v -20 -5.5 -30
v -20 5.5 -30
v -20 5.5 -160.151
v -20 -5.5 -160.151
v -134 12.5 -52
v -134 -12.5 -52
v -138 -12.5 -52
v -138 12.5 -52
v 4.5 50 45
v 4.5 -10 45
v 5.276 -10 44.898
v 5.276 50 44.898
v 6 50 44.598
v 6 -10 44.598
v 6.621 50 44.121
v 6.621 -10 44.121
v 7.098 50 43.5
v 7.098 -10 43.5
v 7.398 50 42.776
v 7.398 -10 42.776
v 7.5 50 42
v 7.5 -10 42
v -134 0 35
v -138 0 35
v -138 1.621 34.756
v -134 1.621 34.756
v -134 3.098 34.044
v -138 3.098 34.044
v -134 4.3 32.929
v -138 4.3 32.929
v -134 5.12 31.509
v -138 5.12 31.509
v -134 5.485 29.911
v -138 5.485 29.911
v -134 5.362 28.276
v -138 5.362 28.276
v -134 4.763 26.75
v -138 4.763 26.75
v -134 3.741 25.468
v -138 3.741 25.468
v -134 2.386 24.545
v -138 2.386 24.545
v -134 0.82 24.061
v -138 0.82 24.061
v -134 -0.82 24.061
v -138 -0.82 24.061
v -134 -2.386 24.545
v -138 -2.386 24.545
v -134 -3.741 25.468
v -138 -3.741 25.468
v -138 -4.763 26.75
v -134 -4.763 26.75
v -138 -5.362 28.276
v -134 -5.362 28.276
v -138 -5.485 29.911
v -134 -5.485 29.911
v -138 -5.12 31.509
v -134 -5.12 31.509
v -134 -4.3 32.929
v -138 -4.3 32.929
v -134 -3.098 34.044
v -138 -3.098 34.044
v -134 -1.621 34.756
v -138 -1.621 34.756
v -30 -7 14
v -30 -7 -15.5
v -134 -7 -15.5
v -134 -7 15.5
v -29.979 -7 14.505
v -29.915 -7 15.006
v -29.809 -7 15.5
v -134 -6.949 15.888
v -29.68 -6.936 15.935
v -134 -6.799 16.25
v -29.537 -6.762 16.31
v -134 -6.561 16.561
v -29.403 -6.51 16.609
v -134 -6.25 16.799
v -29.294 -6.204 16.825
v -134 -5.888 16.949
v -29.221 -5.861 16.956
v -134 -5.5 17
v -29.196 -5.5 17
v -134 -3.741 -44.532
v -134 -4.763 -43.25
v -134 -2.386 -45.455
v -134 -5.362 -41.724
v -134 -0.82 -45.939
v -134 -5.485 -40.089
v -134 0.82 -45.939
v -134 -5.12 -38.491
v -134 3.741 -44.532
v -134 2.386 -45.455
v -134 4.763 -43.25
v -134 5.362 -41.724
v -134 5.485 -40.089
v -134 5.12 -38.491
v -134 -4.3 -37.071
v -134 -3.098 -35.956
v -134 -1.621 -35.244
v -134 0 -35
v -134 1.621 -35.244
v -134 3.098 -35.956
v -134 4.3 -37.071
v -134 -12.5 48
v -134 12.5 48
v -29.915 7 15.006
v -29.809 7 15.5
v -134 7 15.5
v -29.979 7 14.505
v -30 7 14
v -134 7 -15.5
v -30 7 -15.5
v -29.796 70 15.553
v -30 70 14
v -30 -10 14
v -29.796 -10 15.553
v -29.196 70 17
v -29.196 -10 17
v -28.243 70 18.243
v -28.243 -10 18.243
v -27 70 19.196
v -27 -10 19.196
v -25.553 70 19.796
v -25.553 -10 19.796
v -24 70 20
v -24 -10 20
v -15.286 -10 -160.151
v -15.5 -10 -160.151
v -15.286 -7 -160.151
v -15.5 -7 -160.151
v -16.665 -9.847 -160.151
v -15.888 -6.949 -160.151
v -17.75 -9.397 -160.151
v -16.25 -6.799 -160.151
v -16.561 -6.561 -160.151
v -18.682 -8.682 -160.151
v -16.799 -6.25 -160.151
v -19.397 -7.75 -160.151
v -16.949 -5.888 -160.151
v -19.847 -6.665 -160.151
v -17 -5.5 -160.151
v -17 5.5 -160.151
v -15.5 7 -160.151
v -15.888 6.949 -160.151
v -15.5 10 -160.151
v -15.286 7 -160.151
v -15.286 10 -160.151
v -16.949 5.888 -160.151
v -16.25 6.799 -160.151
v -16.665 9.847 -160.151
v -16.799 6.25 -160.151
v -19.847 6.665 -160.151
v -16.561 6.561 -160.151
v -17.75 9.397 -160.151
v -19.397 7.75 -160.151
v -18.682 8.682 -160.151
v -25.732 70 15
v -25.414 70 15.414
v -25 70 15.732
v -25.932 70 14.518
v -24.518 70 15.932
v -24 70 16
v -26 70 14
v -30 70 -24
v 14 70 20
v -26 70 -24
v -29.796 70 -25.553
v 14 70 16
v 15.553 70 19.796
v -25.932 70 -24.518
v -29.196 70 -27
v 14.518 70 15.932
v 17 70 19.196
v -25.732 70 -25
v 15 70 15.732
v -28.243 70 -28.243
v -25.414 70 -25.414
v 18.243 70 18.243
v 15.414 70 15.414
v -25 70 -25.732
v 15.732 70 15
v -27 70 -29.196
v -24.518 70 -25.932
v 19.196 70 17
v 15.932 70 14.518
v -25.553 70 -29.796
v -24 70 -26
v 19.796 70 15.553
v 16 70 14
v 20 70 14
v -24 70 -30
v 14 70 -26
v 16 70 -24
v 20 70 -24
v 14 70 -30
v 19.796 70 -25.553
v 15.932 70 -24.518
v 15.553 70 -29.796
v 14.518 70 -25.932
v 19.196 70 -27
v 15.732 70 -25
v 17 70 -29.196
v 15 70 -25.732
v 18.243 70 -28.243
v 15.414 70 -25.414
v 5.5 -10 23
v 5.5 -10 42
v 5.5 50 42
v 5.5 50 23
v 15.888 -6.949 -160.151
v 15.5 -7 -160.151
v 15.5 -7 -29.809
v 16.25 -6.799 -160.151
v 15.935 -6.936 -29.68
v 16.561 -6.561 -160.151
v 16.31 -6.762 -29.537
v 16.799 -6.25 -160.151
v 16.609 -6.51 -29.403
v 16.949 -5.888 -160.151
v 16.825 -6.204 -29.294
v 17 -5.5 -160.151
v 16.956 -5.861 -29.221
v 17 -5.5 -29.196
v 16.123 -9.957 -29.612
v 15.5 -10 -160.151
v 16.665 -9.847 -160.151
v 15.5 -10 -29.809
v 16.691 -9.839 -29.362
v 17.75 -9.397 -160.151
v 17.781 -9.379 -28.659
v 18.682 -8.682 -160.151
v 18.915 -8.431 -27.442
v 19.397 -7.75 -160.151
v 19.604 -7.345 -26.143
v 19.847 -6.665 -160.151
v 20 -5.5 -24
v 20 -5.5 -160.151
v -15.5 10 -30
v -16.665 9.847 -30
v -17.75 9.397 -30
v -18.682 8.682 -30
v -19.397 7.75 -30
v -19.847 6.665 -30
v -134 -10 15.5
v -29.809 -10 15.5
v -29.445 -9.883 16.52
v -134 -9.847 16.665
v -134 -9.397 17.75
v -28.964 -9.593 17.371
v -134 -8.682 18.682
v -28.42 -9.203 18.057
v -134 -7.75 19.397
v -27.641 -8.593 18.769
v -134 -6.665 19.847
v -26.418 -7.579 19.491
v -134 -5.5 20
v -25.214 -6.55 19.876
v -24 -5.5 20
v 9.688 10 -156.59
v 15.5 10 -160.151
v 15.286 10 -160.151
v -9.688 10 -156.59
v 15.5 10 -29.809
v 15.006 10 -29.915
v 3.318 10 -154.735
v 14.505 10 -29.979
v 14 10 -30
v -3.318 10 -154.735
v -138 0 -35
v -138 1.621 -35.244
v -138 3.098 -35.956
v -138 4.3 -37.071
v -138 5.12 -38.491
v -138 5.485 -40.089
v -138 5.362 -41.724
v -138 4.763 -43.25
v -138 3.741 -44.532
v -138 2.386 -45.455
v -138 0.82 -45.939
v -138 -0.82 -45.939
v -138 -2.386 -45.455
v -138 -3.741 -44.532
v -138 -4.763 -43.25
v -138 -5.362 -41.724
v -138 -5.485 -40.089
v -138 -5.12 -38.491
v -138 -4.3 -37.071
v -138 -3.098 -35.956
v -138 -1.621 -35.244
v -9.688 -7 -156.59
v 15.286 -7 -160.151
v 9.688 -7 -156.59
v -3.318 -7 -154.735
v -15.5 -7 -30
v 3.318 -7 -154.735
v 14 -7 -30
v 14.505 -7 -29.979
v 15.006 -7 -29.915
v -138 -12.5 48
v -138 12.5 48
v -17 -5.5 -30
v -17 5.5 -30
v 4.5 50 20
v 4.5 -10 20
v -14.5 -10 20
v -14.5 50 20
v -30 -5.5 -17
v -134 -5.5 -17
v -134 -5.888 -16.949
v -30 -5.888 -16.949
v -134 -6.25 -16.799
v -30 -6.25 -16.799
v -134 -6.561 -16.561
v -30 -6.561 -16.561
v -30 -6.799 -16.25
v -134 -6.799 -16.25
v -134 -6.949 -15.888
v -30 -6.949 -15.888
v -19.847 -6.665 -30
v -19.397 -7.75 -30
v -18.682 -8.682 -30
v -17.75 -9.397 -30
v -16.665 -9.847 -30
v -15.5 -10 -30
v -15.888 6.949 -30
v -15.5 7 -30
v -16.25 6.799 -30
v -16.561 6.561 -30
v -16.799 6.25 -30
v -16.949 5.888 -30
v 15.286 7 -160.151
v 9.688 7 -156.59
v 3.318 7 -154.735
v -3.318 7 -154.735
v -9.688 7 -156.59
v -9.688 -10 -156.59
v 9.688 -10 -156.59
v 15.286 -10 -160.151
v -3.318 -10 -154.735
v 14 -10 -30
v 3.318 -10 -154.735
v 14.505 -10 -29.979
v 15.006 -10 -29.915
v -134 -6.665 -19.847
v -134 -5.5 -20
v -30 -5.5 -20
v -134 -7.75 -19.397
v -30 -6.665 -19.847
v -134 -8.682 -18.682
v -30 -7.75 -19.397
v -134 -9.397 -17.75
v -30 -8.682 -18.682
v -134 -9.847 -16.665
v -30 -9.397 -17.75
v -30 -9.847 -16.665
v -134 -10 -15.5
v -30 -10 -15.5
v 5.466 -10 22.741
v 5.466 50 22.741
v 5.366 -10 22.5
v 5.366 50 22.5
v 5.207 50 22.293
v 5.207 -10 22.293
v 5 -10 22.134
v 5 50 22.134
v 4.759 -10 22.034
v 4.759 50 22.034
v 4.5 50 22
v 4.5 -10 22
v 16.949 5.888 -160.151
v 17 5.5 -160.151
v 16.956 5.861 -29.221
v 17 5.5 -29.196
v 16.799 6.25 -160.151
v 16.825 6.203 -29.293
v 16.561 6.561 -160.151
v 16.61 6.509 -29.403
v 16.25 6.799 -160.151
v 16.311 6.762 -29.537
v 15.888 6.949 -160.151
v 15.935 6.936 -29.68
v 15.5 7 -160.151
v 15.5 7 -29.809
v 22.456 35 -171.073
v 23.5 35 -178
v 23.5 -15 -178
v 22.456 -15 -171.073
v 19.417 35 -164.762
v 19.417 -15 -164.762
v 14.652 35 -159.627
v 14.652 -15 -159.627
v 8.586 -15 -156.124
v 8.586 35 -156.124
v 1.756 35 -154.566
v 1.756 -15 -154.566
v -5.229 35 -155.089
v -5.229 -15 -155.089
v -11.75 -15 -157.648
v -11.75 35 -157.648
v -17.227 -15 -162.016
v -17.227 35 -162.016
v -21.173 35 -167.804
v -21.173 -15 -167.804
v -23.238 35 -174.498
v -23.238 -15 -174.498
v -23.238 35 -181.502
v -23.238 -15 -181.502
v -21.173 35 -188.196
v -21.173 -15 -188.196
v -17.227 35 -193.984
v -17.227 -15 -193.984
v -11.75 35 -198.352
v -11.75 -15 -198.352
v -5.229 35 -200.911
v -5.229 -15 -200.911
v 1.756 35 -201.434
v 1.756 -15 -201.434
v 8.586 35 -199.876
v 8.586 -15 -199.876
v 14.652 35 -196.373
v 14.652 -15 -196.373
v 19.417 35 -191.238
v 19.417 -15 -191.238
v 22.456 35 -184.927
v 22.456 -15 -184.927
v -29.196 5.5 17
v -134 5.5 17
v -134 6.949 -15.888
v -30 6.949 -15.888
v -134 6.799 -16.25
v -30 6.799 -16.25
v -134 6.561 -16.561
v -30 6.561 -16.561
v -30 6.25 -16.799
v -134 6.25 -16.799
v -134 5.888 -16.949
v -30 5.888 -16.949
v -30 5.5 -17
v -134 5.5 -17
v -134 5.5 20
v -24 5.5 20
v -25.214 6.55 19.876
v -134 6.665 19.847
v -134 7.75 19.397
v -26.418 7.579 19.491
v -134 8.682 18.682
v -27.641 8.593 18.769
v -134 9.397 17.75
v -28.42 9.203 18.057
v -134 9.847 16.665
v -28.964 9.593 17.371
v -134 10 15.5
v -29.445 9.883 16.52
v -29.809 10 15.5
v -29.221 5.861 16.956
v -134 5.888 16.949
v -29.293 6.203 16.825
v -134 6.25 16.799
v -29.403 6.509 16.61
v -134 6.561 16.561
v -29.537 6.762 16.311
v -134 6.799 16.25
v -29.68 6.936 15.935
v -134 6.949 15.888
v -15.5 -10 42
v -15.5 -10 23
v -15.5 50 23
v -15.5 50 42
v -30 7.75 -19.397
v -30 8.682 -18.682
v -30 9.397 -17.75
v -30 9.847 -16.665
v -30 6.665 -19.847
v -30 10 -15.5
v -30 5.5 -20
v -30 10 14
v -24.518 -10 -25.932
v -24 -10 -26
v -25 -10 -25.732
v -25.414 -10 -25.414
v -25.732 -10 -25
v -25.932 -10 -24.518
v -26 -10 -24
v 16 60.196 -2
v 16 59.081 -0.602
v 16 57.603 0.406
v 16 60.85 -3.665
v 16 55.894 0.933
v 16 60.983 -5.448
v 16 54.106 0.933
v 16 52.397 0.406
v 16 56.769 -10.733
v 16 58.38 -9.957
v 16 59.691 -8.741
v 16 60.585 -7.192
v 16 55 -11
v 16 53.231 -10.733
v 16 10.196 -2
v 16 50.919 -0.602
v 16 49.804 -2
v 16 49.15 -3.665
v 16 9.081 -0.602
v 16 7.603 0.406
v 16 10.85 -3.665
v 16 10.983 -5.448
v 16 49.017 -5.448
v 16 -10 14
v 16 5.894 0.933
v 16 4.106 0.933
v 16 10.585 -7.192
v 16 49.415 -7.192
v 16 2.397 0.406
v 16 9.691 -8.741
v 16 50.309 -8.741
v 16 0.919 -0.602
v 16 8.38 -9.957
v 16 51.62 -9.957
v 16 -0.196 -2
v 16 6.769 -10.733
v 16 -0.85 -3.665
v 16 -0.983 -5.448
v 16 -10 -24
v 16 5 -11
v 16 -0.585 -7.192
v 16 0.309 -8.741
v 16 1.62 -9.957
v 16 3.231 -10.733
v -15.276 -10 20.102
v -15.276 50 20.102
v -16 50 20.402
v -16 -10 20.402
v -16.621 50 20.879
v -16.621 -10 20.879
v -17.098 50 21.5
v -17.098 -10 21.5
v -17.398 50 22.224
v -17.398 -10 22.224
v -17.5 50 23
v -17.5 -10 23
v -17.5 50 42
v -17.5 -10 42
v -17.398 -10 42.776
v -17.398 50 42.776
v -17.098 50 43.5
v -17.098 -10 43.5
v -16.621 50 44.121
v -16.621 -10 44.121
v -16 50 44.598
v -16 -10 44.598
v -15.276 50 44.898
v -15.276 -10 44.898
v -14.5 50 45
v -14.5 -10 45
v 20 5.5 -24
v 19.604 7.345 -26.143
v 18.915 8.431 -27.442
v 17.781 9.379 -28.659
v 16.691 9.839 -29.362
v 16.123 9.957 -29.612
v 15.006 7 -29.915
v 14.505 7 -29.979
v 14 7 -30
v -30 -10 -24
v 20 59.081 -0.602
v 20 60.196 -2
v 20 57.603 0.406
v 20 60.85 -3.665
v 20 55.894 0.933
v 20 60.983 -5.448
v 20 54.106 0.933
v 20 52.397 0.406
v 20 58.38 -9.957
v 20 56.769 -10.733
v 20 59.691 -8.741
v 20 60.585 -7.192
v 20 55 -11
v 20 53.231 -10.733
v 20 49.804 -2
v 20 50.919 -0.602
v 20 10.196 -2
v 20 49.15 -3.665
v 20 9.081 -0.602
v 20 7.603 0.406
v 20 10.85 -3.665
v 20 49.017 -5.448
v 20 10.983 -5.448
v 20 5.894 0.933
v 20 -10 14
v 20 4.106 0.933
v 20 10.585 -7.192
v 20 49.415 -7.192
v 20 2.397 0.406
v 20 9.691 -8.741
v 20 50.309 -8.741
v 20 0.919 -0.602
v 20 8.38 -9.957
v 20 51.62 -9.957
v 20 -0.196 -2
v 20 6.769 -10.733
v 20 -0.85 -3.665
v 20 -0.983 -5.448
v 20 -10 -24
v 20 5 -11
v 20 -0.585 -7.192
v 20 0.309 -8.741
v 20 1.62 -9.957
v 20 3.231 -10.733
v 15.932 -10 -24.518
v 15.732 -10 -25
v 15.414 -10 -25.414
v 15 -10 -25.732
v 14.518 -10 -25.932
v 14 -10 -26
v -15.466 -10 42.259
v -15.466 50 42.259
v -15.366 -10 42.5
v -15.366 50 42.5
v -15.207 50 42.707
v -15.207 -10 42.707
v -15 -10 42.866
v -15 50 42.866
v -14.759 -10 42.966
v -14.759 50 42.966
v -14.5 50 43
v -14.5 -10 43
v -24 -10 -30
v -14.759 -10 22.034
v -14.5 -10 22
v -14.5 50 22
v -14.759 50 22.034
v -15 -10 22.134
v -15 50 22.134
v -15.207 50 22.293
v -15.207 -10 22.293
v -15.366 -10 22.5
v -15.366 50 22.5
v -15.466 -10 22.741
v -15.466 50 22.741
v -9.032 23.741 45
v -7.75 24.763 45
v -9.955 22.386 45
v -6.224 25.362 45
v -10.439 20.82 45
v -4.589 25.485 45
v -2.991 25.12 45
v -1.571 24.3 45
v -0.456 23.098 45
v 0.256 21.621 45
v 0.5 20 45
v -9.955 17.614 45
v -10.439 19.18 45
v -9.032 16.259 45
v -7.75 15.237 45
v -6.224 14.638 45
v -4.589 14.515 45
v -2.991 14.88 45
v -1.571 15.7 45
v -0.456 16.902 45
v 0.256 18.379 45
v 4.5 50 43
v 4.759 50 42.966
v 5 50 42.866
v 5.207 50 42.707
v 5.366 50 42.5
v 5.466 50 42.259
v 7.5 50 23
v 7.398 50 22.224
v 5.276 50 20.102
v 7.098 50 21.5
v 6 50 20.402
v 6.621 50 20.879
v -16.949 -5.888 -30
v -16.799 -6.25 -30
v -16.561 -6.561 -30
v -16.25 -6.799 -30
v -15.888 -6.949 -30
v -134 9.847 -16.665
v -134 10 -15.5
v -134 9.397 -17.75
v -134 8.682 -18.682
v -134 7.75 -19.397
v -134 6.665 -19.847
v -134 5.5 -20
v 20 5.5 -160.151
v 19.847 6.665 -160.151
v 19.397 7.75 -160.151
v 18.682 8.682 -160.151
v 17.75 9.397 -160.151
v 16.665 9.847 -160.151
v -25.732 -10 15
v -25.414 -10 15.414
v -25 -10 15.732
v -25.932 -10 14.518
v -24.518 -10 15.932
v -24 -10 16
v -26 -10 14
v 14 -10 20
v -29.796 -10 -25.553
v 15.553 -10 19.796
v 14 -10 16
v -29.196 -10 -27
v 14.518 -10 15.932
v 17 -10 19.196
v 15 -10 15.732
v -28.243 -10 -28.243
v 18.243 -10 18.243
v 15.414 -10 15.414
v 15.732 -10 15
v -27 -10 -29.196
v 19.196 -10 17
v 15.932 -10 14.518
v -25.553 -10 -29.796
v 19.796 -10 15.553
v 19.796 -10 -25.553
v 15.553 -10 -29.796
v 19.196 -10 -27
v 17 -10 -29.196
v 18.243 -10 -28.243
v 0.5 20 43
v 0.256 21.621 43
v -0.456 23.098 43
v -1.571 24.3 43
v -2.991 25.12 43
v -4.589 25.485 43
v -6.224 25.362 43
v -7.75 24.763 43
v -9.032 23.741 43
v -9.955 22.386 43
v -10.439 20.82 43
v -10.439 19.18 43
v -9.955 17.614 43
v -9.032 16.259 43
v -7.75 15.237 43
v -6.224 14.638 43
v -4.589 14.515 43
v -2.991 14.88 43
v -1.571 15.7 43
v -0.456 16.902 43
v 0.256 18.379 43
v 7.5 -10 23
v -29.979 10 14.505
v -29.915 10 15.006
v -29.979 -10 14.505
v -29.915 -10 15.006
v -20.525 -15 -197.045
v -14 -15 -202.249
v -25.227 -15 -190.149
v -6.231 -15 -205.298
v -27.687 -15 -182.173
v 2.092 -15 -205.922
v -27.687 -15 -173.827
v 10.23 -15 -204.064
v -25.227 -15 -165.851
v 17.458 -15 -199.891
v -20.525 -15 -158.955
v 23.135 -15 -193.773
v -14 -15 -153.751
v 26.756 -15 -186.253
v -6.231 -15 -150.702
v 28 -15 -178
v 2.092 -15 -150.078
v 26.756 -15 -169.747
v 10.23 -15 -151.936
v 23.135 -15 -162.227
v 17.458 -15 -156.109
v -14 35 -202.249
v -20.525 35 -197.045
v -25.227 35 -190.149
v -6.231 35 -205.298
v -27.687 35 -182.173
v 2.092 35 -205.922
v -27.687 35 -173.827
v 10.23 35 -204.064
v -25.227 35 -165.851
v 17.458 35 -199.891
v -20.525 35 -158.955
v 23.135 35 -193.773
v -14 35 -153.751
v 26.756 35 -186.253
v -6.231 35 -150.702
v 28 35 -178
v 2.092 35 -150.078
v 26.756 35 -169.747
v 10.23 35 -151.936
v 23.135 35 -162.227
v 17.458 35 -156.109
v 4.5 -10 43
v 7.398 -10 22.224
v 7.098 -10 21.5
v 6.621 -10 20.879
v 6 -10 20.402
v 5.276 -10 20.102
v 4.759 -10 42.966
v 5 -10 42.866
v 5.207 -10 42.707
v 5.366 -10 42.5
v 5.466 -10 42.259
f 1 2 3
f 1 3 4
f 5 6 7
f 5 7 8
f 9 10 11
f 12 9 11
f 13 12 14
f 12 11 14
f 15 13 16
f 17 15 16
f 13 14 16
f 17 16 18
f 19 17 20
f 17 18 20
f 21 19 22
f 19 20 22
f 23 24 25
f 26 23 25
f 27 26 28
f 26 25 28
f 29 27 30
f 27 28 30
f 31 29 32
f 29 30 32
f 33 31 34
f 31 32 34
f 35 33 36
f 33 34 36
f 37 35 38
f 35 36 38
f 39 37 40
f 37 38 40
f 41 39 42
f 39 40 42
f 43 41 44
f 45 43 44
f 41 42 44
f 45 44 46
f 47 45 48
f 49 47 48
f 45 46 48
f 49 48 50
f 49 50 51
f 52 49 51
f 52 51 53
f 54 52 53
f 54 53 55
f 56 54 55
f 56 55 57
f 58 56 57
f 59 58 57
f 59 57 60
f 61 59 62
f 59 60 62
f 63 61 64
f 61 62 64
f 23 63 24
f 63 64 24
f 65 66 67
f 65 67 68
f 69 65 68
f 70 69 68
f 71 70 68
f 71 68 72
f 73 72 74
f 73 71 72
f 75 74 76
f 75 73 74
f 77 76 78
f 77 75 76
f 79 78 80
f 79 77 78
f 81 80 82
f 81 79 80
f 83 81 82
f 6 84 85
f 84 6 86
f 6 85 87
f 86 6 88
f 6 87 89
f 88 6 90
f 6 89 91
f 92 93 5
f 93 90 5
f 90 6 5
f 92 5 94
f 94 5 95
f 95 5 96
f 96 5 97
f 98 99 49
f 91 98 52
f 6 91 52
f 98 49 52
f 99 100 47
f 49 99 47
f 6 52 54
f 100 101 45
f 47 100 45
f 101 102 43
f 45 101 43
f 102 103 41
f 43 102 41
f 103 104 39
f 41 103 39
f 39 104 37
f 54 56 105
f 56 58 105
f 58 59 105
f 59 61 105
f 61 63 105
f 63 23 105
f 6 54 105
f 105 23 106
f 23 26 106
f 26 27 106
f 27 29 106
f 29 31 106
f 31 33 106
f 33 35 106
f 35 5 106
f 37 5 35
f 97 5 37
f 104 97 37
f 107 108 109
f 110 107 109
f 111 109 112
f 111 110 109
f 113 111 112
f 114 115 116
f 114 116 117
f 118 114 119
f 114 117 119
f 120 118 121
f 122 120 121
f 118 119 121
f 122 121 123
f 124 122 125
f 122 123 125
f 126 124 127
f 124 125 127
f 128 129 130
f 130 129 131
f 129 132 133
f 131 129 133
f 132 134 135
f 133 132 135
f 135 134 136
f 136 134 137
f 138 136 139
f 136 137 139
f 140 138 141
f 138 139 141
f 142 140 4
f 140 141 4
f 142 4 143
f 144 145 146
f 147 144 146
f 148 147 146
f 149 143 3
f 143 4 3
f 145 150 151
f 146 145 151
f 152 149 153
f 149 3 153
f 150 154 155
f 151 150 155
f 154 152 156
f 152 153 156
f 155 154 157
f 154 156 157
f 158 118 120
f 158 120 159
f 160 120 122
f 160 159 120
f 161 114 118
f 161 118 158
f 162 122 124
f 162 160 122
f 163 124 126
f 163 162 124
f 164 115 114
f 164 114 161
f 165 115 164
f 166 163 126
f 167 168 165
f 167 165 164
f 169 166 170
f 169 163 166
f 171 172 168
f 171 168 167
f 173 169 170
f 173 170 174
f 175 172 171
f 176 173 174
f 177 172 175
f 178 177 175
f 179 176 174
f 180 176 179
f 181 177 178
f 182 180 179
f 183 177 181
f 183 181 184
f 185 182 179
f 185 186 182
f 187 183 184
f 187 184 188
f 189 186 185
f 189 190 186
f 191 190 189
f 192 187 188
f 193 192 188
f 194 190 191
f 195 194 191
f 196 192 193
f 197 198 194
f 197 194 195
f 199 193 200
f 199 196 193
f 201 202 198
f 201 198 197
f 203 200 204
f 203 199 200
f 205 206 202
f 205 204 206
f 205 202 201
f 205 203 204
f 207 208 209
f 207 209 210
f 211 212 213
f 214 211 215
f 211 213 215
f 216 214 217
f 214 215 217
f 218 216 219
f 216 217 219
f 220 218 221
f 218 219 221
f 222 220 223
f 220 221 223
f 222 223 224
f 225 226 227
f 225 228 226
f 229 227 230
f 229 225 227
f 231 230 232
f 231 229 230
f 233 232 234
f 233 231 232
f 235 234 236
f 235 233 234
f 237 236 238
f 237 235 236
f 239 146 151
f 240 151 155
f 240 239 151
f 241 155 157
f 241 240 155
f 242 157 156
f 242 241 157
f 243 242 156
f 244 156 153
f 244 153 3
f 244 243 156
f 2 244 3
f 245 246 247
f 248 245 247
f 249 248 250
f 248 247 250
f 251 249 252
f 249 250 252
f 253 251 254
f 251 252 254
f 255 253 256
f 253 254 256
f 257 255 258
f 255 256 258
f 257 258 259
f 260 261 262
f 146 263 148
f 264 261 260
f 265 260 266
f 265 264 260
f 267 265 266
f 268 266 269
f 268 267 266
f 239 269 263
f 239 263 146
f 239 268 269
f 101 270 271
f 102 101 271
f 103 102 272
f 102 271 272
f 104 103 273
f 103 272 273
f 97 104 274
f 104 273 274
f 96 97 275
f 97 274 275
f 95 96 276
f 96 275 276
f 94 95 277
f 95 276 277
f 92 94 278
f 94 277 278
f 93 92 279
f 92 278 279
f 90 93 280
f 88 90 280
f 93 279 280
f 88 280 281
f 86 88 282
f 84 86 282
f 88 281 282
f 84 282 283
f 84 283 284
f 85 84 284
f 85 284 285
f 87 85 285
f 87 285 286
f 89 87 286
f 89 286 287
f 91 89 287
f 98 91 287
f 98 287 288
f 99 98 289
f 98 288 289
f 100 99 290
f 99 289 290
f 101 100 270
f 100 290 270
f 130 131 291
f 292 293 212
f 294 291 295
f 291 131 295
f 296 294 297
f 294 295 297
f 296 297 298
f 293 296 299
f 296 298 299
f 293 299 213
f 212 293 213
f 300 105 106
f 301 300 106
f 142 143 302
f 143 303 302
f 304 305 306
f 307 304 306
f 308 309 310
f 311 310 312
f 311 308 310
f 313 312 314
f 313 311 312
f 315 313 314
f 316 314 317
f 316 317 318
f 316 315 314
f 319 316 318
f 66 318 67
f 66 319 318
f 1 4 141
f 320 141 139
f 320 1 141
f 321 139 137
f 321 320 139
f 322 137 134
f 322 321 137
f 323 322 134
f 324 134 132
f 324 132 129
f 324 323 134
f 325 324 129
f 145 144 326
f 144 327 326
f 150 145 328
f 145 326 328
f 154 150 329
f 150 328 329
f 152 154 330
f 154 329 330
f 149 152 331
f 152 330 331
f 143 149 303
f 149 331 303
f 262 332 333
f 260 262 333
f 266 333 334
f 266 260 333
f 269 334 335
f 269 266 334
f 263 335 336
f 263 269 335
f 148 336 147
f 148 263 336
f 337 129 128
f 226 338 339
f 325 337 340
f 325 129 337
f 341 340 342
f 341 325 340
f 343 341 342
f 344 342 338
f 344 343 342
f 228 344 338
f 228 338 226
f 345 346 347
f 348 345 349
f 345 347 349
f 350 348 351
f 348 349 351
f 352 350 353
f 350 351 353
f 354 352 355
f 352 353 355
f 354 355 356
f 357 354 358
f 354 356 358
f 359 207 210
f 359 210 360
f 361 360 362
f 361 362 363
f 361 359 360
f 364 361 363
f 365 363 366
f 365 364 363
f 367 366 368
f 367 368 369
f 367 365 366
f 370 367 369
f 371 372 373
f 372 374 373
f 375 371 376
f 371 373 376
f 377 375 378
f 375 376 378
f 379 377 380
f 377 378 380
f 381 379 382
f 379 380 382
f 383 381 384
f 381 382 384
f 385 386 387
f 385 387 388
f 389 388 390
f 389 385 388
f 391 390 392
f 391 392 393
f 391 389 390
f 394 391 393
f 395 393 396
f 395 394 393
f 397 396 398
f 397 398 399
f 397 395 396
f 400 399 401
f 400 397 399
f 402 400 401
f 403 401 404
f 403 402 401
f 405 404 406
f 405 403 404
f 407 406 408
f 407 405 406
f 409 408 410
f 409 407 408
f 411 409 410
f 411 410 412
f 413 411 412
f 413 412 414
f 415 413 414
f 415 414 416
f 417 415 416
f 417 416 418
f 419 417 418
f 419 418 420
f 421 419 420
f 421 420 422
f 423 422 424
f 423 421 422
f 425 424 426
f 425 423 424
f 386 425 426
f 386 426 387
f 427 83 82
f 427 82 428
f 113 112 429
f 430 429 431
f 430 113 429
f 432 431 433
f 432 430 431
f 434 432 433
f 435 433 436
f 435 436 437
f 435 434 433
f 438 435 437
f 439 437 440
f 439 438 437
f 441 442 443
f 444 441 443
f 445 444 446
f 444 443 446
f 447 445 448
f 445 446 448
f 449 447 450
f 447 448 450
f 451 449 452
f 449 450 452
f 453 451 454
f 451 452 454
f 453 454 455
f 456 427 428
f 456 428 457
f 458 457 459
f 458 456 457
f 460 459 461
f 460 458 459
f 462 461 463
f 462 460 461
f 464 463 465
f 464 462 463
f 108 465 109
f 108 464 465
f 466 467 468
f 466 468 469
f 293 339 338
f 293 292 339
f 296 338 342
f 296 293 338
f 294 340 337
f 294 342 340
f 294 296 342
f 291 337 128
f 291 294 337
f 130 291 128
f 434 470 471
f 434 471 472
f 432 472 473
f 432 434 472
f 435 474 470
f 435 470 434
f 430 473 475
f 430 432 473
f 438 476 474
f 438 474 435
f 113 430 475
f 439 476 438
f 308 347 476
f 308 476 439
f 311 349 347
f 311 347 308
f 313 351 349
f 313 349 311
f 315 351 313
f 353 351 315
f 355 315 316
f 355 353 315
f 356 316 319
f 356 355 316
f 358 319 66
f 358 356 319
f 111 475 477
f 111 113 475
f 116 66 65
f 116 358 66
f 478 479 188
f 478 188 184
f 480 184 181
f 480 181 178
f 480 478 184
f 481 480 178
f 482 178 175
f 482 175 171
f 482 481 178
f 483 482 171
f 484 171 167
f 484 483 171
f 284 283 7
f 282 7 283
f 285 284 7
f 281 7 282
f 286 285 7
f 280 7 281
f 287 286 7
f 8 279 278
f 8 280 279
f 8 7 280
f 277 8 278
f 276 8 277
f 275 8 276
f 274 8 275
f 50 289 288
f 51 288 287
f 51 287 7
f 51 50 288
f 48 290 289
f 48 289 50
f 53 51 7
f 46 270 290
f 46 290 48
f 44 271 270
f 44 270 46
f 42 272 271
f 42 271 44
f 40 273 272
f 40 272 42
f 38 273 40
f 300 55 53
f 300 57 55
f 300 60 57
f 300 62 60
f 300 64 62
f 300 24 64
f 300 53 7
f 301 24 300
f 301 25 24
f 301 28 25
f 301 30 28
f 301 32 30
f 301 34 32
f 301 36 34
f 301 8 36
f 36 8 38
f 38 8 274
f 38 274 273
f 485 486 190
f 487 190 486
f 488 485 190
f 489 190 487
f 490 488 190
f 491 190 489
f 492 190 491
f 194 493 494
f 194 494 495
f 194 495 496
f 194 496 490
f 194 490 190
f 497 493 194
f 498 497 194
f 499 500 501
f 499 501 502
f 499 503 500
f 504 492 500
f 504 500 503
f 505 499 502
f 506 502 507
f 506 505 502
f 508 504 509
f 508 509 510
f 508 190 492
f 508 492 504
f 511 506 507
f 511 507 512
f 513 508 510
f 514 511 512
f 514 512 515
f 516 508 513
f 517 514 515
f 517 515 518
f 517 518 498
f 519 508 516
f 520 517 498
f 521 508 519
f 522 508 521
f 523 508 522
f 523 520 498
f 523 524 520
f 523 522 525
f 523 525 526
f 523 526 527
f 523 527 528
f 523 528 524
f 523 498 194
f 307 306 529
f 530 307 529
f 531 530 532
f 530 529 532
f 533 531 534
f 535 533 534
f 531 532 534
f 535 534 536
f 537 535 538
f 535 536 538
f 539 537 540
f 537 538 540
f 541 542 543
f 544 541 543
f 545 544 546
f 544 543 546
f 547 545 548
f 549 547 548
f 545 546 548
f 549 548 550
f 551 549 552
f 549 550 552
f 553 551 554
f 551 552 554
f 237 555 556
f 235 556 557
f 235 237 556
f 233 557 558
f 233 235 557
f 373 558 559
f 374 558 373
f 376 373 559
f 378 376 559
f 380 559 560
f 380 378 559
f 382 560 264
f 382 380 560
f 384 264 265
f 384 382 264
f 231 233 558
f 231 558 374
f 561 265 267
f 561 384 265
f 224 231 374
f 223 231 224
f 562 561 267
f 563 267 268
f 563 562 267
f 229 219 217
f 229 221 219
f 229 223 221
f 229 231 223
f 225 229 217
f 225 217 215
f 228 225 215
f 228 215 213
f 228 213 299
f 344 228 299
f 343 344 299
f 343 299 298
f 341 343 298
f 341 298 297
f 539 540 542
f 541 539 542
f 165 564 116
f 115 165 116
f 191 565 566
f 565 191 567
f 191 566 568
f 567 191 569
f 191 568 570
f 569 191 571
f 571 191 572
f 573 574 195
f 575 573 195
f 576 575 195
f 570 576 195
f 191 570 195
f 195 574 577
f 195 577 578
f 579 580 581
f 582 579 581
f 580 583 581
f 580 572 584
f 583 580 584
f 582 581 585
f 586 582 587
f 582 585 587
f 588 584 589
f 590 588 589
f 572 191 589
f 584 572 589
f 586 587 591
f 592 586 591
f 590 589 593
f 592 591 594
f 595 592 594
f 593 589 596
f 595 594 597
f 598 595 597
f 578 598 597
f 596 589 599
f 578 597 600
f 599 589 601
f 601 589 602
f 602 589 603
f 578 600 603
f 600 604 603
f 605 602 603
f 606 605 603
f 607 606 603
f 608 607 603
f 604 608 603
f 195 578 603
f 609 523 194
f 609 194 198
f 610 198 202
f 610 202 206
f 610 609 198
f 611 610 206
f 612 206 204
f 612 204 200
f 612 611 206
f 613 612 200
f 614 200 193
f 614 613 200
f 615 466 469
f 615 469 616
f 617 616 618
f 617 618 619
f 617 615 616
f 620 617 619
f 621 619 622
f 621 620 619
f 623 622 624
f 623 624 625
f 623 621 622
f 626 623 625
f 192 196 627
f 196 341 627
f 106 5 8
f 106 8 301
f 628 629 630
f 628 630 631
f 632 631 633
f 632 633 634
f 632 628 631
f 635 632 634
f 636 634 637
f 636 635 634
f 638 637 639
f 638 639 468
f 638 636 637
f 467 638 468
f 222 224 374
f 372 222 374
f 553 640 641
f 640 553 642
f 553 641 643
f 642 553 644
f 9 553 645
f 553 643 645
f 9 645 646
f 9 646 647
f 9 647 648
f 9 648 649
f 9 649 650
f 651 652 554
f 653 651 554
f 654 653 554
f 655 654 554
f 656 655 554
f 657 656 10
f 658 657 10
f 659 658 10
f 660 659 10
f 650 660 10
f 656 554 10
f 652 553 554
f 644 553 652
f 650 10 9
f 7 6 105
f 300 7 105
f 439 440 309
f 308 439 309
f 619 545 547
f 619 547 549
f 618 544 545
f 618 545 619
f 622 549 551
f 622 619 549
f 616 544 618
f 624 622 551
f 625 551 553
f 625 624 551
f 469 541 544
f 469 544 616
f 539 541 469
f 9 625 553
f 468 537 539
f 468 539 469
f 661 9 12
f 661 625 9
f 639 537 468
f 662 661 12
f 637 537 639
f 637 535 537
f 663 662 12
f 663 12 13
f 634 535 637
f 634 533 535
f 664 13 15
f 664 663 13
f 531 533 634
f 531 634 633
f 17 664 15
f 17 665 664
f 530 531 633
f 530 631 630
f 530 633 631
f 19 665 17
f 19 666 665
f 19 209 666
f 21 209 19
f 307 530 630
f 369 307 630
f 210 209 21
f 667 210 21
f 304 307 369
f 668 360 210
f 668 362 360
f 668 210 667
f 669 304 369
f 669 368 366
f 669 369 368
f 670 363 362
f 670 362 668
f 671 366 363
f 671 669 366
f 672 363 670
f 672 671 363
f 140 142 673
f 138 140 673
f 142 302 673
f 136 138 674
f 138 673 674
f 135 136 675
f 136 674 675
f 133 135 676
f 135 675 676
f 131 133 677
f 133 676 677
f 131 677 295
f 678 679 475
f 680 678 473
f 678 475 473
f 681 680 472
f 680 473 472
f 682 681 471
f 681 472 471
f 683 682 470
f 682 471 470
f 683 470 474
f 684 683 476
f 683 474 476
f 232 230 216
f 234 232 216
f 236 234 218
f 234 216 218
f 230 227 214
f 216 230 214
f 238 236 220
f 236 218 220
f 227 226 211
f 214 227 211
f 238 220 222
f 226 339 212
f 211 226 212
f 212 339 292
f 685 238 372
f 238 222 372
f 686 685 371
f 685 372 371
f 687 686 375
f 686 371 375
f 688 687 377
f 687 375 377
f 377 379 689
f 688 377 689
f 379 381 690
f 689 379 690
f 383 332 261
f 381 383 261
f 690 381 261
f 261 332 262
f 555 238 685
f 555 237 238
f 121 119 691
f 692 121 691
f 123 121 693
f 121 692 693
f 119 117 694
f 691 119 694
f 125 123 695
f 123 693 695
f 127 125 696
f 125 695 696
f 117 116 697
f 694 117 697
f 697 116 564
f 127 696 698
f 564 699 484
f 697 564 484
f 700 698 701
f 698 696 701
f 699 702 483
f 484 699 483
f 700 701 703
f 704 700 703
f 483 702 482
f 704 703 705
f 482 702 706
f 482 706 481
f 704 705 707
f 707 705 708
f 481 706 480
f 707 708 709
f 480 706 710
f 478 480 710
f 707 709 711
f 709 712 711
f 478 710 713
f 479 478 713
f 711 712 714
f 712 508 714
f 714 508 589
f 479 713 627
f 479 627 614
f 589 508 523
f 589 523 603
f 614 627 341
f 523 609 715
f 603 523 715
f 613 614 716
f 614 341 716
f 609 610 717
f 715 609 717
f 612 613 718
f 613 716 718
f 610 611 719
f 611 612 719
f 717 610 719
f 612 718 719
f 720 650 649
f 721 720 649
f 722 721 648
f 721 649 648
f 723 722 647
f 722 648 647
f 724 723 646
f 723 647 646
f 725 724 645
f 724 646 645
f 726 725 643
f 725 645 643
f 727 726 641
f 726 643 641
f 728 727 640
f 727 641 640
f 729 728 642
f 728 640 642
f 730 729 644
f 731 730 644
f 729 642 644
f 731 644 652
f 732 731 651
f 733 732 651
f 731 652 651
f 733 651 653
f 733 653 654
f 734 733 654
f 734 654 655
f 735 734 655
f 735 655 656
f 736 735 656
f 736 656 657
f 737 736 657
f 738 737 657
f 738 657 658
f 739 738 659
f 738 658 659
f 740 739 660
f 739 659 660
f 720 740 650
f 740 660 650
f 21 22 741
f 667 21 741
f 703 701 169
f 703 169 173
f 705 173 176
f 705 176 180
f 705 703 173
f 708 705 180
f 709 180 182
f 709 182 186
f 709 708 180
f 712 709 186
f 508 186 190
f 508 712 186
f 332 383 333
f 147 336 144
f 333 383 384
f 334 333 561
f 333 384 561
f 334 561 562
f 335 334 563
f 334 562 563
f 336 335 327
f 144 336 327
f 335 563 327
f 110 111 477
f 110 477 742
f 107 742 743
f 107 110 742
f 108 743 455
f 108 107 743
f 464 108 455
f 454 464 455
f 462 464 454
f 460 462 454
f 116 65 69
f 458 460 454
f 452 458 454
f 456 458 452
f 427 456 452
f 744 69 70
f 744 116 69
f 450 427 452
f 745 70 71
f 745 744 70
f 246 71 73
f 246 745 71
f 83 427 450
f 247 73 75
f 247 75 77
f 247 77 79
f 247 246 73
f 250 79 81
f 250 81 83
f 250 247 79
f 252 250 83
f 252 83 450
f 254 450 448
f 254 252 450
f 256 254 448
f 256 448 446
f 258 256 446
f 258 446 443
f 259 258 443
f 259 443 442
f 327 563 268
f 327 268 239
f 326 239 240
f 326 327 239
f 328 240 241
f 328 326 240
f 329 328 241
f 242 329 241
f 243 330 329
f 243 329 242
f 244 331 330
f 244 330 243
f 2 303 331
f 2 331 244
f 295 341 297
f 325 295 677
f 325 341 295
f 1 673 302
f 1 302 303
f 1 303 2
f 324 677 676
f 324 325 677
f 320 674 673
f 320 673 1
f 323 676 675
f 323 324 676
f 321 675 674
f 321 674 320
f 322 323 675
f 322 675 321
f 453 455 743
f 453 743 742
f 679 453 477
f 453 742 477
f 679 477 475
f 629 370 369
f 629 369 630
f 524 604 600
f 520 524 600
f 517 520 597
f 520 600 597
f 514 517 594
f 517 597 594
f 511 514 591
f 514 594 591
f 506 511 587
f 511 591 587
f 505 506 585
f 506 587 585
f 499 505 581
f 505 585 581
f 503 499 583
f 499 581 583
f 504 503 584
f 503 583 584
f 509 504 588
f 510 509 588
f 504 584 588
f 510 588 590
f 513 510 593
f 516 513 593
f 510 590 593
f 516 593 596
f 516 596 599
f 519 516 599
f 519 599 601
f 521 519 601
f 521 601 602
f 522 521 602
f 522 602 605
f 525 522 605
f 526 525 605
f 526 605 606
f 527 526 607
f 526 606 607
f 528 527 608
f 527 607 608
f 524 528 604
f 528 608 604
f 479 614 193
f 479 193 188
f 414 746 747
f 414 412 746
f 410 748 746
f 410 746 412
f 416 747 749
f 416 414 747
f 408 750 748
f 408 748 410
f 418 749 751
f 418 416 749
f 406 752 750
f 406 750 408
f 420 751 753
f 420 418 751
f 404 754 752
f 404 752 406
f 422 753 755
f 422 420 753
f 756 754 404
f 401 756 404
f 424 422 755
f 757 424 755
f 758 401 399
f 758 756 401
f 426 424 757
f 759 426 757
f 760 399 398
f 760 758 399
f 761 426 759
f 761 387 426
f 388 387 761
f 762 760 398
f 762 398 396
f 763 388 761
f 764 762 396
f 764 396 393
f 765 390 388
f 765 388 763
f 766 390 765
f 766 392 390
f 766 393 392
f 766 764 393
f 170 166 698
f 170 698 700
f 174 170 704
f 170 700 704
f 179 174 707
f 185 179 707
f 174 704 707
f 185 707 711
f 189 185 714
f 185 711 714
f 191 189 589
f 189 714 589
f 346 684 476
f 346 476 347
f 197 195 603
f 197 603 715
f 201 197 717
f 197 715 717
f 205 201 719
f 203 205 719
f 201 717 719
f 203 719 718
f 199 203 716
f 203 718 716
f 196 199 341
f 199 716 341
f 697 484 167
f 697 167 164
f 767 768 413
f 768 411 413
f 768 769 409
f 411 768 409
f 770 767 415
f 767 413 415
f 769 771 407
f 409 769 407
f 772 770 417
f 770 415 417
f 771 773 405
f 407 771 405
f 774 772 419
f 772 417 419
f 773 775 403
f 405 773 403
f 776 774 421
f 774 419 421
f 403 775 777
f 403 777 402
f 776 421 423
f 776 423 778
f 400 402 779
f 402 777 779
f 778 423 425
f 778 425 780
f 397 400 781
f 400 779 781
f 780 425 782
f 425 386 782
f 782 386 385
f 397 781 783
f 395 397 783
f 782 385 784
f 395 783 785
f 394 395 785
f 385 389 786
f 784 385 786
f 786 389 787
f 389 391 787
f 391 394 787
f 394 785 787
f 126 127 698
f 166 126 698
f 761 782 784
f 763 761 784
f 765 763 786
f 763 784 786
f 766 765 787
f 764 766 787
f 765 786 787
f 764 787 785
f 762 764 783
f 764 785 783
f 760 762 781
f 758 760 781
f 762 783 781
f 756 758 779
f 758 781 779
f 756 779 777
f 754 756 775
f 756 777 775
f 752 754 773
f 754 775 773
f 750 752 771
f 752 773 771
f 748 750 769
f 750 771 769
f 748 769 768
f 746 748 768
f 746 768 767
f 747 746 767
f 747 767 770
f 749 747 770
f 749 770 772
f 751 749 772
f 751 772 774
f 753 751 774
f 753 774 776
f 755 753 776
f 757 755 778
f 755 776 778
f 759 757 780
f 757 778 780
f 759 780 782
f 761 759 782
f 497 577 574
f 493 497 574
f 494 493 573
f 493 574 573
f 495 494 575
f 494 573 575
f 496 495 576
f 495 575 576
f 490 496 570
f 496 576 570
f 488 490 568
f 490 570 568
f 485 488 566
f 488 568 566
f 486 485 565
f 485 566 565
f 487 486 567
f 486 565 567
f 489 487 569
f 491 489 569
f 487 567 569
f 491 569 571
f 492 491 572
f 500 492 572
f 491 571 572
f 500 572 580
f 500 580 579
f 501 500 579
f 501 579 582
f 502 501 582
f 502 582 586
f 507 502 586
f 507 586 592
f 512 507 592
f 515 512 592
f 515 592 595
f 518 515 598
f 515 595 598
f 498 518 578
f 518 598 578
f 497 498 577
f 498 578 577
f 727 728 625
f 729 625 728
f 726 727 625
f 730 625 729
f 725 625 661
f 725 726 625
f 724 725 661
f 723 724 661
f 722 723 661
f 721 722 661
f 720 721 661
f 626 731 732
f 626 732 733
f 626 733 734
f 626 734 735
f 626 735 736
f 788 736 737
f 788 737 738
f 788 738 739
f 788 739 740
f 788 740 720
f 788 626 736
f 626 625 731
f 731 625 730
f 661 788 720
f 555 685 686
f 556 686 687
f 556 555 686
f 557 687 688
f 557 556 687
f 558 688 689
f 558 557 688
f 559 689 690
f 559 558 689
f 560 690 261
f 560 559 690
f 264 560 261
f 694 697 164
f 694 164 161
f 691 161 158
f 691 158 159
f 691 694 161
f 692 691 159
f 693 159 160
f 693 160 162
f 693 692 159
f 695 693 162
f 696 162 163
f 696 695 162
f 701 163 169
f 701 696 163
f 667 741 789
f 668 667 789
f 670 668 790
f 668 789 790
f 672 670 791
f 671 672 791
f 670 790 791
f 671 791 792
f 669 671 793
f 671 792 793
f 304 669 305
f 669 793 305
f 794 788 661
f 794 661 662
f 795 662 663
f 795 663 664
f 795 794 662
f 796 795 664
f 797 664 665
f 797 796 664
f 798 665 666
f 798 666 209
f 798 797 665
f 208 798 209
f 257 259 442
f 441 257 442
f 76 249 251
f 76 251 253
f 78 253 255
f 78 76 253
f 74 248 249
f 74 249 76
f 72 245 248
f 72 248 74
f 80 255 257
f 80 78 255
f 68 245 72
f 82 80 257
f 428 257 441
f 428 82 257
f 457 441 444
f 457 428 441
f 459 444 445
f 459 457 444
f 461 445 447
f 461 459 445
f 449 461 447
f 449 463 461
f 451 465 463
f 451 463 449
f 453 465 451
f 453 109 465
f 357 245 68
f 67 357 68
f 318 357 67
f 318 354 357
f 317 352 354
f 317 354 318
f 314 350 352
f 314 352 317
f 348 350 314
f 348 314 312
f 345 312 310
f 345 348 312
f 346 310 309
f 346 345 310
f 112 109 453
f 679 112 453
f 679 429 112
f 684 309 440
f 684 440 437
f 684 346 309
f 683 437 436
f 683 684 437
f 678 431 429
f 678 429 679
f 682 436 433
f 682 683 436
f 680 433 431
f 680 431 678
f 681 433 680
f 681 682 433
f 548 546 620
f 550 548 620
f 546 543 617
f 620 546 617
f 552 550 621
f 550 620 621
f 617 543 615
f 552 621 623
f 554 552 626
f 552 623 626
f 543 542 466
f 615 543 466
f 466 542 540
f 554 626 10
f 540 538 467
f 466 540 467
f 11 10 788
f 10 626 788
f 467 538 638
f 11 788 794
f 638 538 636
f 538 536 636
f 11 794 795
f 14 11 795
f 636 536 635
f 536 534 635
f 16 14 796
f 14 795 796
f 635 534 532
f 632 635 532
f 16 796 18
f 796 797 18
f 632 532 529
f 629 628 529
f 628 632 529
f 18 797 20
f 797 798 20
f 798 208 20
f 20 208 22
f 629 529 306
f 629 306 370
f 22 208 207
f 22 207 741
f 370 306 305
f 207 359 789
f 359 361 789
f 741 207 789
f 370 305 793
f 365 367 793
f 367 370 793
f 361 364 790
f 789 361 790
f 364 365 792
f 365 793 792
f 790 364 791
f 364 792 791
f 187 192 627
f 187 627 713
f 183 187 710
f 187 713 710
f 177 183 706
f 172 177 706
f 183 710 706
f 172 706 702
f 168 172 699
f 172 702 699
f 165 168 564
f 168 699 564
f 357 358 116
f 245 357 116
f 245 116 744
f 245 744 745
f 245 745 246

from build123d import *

# Parameters (mm, degrees)
AXBXS_8645_68_40_X_20_X_3_1_DEPTH        = 173.360679775
AXBXS_8645_68_40_X_20_X_3_1_2_DEPTH      = 134
AXBXS_8645_68_40_X_20_X_3_1_2_DEPTH_BACK = 23.360679775
BXBXS_8639_82_50_X_50_X_4_2_DEPTH        = 10
BXBXS_8639_82_50_X_50_X_4_2_2_DEPTH      = 70
WELD_START                               = -10
WELD_TRIM_1_DEPTH                        = 20
WELD_TRIM_1_2_DEPTH                      = 20
EXTRUDE_1_DEPTH                          = 5
EXTRUDE_1_DEPTH_BACK                     = 45
SKETCH_8_R                               = 28
SKETCH_8_R_2                             = 23.5
MOVE_FACE_1_BY                           = 10.151380586
CUT_EXTRUDE_1_DEPTH                      = 261.032690304
CUT_EXTRUDE_1_DEPTH_BACK                 = 261.032690304
SKETCH_10_R                              = 23.5
SKETCH_11_W                              = 100
SKETCH_11_H                              = 25
EXTRUDE_2_DEPTH                          = 4
SKETCH_12_R                              = 5.5
CUT_EXTRUDE_2_DEPTH                      = 4
BXBXS_8639_82_25_X_25_X_2_1_DEPTH        = 60
SKETCH_15_R                              = 5.5
CUT_EXTRUDE_3_DEPTH                      = 2
SKETCH_18_R                              = 6
CUT_EXTRUDE_6_DEPTH                      = 4


# Read off the part's stored shape, not the designer's step: Отсечь/Удлинить1
with BuildPart() as part:
    # Sketch1 on segment 1 (carried to segment 1) → Труба axbxs гост8645-68 40 X 20 X 3(1) (new body)
    with BuildSketch(Plane(origin=(0, 0, -150), x_dir=(0, 1, 0), z_dir=(0, 0, 1))):
        with BuildLine():
            Line((-5.5, -20), (5.5, -20))
            ThreePointArc((5.5, -20), (8.681980515, -18.681980515), (10, -15.5))
            Line((10, -15.5), (10, 15.5))
            ThreePointArc((10, 15.5), (8.681980515, 18.681980515), (5.5, 20))
            Line((5.5, 20), (-5.5, 20))
            ThreePointArc((-5.5, 20), (-8.681980515, 18.681980515), (-10, 15.5))
            Line((-10, 15.5), (-10, -15.5))
            ThreePointArc((-10, -15.5), (-8.681980515, -18.681980515), (-5.5, -20))
        make_face()
        with BuildLine():
            Line((-5.5, -17), (5.5, -17))
            ThreePointArc((5.5, -17), (6.560660172, -16.560660172), (7, -15.5))
            Line((7, -15.5), (7, 15.5))
            ThreePointArc((7, 15.5), (6.560660172, 16.560660172), (5.5, 17))
            Line((5.5, 17), (-5.5, 17))
            ThreePointArc((-5.5, 17), (-6.560660172, 16.560660172), (-7, 15.5))
            Line((-7, 15.5), (-7, -15.5))
            ThreePointArc((-7, -15.5), (-6.560660172, -16.560660172), (-5.5, -17))
        make_face(mode=Mode.SUBTRACT)
    extrude(amount=AXBXS_8645_68_40_X_20_X_3_1_DEPTH)

    # Труба axbxs гост8645-68 40 X 20 X 3(1) mitre 1
    split(bisect_by=Plane(origin=(0, 0, 0), x_dir=(0, 1, 0), z_dir=(0.707106781, 0, -0.707106781)), keep=Keep.TOP)

    # Weld Trim 1 2 outline → Weld Trim 1 2 (cut)
    with BuildSketch(Plane(origin=(0, 0, 0), x_dir=(1, 0, 0), z_dir=(0, 1, 0)).offset(WELD_START)):
        with BuildLine():
            Line((14, 30), (-20, 30))
            Line((-20, 30), (-20, 20))
            Line((-20, 20), (20, -20))
            Line((20, -20), (20, 24))
            ThreePointArc((20, 24), (18.242640687, 28.242640687), (14, 30))
        make_face()
    extrude(amount=WELD_TRIM_1_2_DEPTH, mode=Mode.SUBTRACT)

    # Move Face 1: a face moved outward by 10.151381
    extrude(part.faces().sort_by_distance((0, -8, -150))[0], amount=MOVE_FACE_1_BY, dir=(0, 0, -1))

    # Эскиз10 → Вырез-Вытянуть1 (cut, two sides: drawn at the far end of the back side and taken through both)
    with BuildSketch(Plane.XZ.offset(15).offset(-CUT_EXTRUDE_1_DEPTH_BACK)):
        with Locations((0, -178)):
            Circle(SKETCH_10_R)
    extrude(amount=CUT_EXTRUDE_1_DEPTH + CUT_EXTRUDE_1_DEPTH_BACK, mode=Mode.SUBTRACT)


with BuildPart() as body_2:
    # Sketch1 → axbxs _8645-68 40 X 20 X 3_1 2 (new, two sides: drawn at the far end of the back side and taken through both)
    with BuildSketch(Plane(origin=(0, 0, 0), x_dir=(0, 1, 0), z_dir=(-1, 0, 0)).offset(-AXBXS_8645_68_40_X_20_X_3_1_2_DEPTH_BACK)):
        with BuildLine():
            Line((-5.5, -20), (5.5, -20))
            ThreePointArc((5.5, -20), (8.681980515, -18.681980515), (10, -15.5))
            Line((10, -15.5), (10, 15.5))
            ThreePointArc((10, 15.5), (8.681980515, 18.681980515), (5.5, 20))
            Line((5.5, 20), (-5.5, 20))
            ThreePointArc((-5.5, 20), (-8.681980515, 18.681980515), (-10, 15.5))
            Line((-10, 15.5), (-10, -15.5))
            ThreePointArc((-10, -15.5), (-8.681980515, -18.681980515), (-5.5, -20))
        make_face()
        with BuildLine():
            Line((-5.5, -17), (5.5, -17))
            ThreePointArc((5.5, -17), (6.560660172, -16.560660172), (7, -15.5))
            Line((7, -15.5), (7, 15.5))
            ThreePointArc((7, 15.5), (6.560660172, 16.560660172), (5.5, 17))
            Line((5.5, 17), (-5.5, 17))
            ThreePointArc((-5.5, 17), (-6.560660172, 16.560660172), (-7, 15.5))
            Line((-7, 15.5), (-7, -15.5))
            ThreePointArc((-7, -15.5), (-6.560660172, -16.560660172), (-5.5, -17))
        make_face(mode=Mode.SUBTRACT)
    extrude(amount=AXBXS_8645_68_40_X_20_X_3_1_2_DEPTH + AXBXS_8645_68_40_X_20_X_3_1_2_DEPTH_BACK)

    # axbxs _8645-68 40 X 20 X 3_1 2 mitre 1
    split(bisect_by=Plane(origin=(0, 0, 0), x_dir=(0, -1, 0), z_dir=(-0.707106781, 0, 0.707106781)), keep=Keep.TOP)

    # Weld Trim 1 outline → Weld Trim 1 (cut)
    with BuildSketch(Plane(origin=(0, 0, 0), x_dir=(1, 0, 0), z_dir=(0, 1, 0)).offset(WELD_START)):
        with BuildLine():
            ThreePointArc((-30, -14), (-28.242640687, -18.242640687), (-24, -20))
            Line((-24, -20), (20, -20))
            Line((20, -20), (-20, 20))
            Line((-20, 20), (-30, 20))
            Line((-30, 20), (-30, -14))
        make_face()
    extrude(amount=WELD_TRIM_1_DEPTH, mode=Mode.SUBTRACT)


with BuildPart() as body_3:
    # Sketch14 → Труба bxbxs гост8639-82 50 X 50 X 4(2) (new body)
    with BuildSketch(Plane(origin=(-5, 0, -5), x_dir=(1, 0, 0), z_dir=(0, 1, 0))):
        with BuildLine():
            Line((-19, -25), (19, -25))
            ThreePointArc((19, -25), (23.242640687, -23.242640687), (25, -19))
            Line((25, -19), (25, 19))
            ThreePointArc((25, 19), (23.242640687, 23.242640687), (19, 25))
            Line((19, 25), (-19, 25))
            ThreePointArc((-19, 25), (-23.242640687, 23.242640687), (-25, 19))
            Line((-25, 19), (-25, -19))
            ThreePointArc((-25, -19), (-23.242640687, -23.242640687), (-19, -25))
        make_face()
        with BuildLine():
            Line((-19, -21), (19, -21))
            ThreePointArc((19, -21), (20.414213562, -20.414213562), (21, -19))
            Line((21, -19), (21, 19))
            ThreePointArc((21, 19), (20.414213562, 20.414213562), (19, 21))
            Line((19, 21), (-19, 21))
            ThreePointArc((-19, 21), (-20.414213562, 20.414213562), (-21, 19))
            Line((-21, 19), (-21, -19))
            ThreePointArc((-21, -19), (-20.414213562, -20.414213562), (-19, -21))
        make_face(mode=Mode.SUBTRACT)
    extrude(amount=-BXBXS_8639_82_50_X_50_X_4_2_DEPTH)


with BuildPart() as body_4:
    # Sketch14 on segment 2 (carried to segment 2) → bxbxs _8639-82 50 X 50 X 4_2 2 (new body)
    with BuildSketch(Plane(origin=(-5, 0, -5), x_dir=(1, 0, 0), z_dir=(0, 1, 0))):
        with BuildLine():
            Line((-19, -25), (19, -25))
            ThreePointArc((19, -25), (23.242640687, -23.242640687), (25, -19))
            Line((25, -19), (25, 19))
            ThreePointArc((25, 19), (23.242640687, 23.242640687), (19, 25))
            Line((19, 25), (-19, 25))
            ThreePointArc((-19, 25), (-23.242640687, 23.242640687), (-25, 19))
            Line((-25, 19), (-25, -19))
            ThreePointArc((-25, -19), (-23.242640687, -23.242640687), (-19, -25))
        make_face()
        with BuildLine():
            Line((-19, -21), (19, -21))
            ThreePointArc((19, -21), (20.414213562, -20.414213562), (21, -19))
            Line((21, -19), (21, 19))
            ThreePointArc((21, 19), (20.414213562, 20.414213562), (19, 21))
            Line((19, 21), (-19, 21))
            ThreePointArc((-19, 21), (-20.414213562, 20.414213562), (-21, 19))
            Line((-21, 19), (-21, -19))
            ThreePointArc((-21, -19), (-20.414213562, -20.414213562), (-19, -21))
        make_face(mode=Mode.SUBTRACT)
    extrude(amount=BXBXS_8639_82_50_X_50_X_4_2_2_DEPTH)


with BuildPart() as body_5:
    # Эскиз8 → Бобышка-Вытянуть1 (new, two sides: drawn at the far end of the back side and taken through both)
    with BuildSketch(Plane.XZ.offset(10).offset(-EXTRUDE_1_DEPTH_BACK)):
        with Locations((0, -178)):
            Circle(SKETCH_8_R)
        with Locations((0, -178)):
            Circle(SKETCH_8_R_2, mode=Mode.SUBTRACT)
    extrude(amount=EXTRUDE_1_DEPTH + EXTRUDE_1_DEPTH_BACK)


with BuildPart() as body_6:
    # Эскиз11 → Бобышка-Вытянуть2 (new body)
    with BuildSketch(Plane.ZY.offset(134)):
        with Locations((-2, 0)):
            Rectangle(SKETCH_11_W, SKETCH_11_H)
    extrude(amount=EXTRUDE_2_DEPTH)

    # Эскиз12 → Вырез-Вытянуть2 (cut)
    with BuildSketch(Plane.ZY.offset(138)):
        with Locations((-40.5, 0)):
            Circle(SKETCH_12_R)
        with Locations((29.5, 0)):
            Circle(SKETCH_12_R)
    extrude(amount=-CUT_EXTRUDE_2_DEPTH, mode=Mode.SUBTRACT)


with BuildPart() as body_7:
    # Sketch15 → Труба bxbxs гост8639-82 25 X 25 X 2(1) (new body)
    with BuildSketch(Plane(origin=(-5, -10, 32.5), x_dir=(1, 0, 0), z_dir=(0, 1, 0))):
        with BuildLine():
            Line((-9.5, -12.5), (9.5, -12.5))
            ThreePointArc((9.5, -12.5), (11.621320344, -11.621320344), (12.5, -9.5))
            Line((12.5, -9.5), (12.5, 9.5))
            ThreePointArc((12.5, 9.5), (11.621320344, 11.621320344), (9.5, 12.5))
            Line((9.5, 12.5), (-9.5, 12.5))
            ThreePointArc((-9.5, 12.5), (-11.621320344, 11.621320344), (-12.5, 9.5))
            Line((-12.5, 9.5), (-12.5, -9.5))
            ThreePointArc((-12.5, -9.5), (-11.621320344, -11.621320344), (-9.5, -12.5))
        make_face()
        with BuildLine():
            Line((-9.5, -10.5), (9.5, -10.5))
            ThreePointArc((9.5, -10.5), (10.207106781, -10.207106781), (10.5, -9.5))
            Line((10.5, -9.5), (10.5, 9.5))
            ThreePointArc((10.5, 9.5), (10.207106781, 10.207106781), (9.5, 10.5))
            Line((9.5, 10.5), (-9.5, 10.5))
            ThreePointArc((-9.5, 10.5), (-10.207106781, 10.207106781), (-10.5, 9.5))
            Line((-10.5, 9.5), (-10.5, -9.5))
            ThreePointArc((-10.5, -9.5), (-10.207106781, -10.207106781), (-9.5, -10.5))
        make_face(mode=Mode.SUBTRACT)
    extrude(amount=BXBXS_8639_82_25_X_25_X_2_1_DEPTH)

    # Эскиз15 → Вырез-Вытянуть3 (cut)
    with BuildSketch(Plane.XY.offset(45)):
        with Locations((-5, 20)):
            Circle(SKETCH_15_R)
    extrude(amount=-CUT_EXTRUDE_3_DEPTH, mode=Mode.SUBTRACT)


with BuildPart() as body_3_1:
    add(body_3.part)

    # Combine 1: union body 4
    add(body_4.part)

    # Эскиз18 → Вырез-Вытянуть6 (cut)
    with BuildSketch(Plane(origin=(20, 0, 0), x_dir=(0, 0, -1), z_dir=(1, 0, 0))):
        with Locations((5, 55)):
            Circle(SKETCH_18_R)
        with Locations((5, 5)):
            Circle(SKETCH_18_R)
    extrude(amount=-CUT_EXTRUDE_6_DEPTH, mode=Mode.SUBTRACT)


solid = Compound([part.part, body_2.part, body_5.part, body_6.part, body_7.part, body_3_1.part])
